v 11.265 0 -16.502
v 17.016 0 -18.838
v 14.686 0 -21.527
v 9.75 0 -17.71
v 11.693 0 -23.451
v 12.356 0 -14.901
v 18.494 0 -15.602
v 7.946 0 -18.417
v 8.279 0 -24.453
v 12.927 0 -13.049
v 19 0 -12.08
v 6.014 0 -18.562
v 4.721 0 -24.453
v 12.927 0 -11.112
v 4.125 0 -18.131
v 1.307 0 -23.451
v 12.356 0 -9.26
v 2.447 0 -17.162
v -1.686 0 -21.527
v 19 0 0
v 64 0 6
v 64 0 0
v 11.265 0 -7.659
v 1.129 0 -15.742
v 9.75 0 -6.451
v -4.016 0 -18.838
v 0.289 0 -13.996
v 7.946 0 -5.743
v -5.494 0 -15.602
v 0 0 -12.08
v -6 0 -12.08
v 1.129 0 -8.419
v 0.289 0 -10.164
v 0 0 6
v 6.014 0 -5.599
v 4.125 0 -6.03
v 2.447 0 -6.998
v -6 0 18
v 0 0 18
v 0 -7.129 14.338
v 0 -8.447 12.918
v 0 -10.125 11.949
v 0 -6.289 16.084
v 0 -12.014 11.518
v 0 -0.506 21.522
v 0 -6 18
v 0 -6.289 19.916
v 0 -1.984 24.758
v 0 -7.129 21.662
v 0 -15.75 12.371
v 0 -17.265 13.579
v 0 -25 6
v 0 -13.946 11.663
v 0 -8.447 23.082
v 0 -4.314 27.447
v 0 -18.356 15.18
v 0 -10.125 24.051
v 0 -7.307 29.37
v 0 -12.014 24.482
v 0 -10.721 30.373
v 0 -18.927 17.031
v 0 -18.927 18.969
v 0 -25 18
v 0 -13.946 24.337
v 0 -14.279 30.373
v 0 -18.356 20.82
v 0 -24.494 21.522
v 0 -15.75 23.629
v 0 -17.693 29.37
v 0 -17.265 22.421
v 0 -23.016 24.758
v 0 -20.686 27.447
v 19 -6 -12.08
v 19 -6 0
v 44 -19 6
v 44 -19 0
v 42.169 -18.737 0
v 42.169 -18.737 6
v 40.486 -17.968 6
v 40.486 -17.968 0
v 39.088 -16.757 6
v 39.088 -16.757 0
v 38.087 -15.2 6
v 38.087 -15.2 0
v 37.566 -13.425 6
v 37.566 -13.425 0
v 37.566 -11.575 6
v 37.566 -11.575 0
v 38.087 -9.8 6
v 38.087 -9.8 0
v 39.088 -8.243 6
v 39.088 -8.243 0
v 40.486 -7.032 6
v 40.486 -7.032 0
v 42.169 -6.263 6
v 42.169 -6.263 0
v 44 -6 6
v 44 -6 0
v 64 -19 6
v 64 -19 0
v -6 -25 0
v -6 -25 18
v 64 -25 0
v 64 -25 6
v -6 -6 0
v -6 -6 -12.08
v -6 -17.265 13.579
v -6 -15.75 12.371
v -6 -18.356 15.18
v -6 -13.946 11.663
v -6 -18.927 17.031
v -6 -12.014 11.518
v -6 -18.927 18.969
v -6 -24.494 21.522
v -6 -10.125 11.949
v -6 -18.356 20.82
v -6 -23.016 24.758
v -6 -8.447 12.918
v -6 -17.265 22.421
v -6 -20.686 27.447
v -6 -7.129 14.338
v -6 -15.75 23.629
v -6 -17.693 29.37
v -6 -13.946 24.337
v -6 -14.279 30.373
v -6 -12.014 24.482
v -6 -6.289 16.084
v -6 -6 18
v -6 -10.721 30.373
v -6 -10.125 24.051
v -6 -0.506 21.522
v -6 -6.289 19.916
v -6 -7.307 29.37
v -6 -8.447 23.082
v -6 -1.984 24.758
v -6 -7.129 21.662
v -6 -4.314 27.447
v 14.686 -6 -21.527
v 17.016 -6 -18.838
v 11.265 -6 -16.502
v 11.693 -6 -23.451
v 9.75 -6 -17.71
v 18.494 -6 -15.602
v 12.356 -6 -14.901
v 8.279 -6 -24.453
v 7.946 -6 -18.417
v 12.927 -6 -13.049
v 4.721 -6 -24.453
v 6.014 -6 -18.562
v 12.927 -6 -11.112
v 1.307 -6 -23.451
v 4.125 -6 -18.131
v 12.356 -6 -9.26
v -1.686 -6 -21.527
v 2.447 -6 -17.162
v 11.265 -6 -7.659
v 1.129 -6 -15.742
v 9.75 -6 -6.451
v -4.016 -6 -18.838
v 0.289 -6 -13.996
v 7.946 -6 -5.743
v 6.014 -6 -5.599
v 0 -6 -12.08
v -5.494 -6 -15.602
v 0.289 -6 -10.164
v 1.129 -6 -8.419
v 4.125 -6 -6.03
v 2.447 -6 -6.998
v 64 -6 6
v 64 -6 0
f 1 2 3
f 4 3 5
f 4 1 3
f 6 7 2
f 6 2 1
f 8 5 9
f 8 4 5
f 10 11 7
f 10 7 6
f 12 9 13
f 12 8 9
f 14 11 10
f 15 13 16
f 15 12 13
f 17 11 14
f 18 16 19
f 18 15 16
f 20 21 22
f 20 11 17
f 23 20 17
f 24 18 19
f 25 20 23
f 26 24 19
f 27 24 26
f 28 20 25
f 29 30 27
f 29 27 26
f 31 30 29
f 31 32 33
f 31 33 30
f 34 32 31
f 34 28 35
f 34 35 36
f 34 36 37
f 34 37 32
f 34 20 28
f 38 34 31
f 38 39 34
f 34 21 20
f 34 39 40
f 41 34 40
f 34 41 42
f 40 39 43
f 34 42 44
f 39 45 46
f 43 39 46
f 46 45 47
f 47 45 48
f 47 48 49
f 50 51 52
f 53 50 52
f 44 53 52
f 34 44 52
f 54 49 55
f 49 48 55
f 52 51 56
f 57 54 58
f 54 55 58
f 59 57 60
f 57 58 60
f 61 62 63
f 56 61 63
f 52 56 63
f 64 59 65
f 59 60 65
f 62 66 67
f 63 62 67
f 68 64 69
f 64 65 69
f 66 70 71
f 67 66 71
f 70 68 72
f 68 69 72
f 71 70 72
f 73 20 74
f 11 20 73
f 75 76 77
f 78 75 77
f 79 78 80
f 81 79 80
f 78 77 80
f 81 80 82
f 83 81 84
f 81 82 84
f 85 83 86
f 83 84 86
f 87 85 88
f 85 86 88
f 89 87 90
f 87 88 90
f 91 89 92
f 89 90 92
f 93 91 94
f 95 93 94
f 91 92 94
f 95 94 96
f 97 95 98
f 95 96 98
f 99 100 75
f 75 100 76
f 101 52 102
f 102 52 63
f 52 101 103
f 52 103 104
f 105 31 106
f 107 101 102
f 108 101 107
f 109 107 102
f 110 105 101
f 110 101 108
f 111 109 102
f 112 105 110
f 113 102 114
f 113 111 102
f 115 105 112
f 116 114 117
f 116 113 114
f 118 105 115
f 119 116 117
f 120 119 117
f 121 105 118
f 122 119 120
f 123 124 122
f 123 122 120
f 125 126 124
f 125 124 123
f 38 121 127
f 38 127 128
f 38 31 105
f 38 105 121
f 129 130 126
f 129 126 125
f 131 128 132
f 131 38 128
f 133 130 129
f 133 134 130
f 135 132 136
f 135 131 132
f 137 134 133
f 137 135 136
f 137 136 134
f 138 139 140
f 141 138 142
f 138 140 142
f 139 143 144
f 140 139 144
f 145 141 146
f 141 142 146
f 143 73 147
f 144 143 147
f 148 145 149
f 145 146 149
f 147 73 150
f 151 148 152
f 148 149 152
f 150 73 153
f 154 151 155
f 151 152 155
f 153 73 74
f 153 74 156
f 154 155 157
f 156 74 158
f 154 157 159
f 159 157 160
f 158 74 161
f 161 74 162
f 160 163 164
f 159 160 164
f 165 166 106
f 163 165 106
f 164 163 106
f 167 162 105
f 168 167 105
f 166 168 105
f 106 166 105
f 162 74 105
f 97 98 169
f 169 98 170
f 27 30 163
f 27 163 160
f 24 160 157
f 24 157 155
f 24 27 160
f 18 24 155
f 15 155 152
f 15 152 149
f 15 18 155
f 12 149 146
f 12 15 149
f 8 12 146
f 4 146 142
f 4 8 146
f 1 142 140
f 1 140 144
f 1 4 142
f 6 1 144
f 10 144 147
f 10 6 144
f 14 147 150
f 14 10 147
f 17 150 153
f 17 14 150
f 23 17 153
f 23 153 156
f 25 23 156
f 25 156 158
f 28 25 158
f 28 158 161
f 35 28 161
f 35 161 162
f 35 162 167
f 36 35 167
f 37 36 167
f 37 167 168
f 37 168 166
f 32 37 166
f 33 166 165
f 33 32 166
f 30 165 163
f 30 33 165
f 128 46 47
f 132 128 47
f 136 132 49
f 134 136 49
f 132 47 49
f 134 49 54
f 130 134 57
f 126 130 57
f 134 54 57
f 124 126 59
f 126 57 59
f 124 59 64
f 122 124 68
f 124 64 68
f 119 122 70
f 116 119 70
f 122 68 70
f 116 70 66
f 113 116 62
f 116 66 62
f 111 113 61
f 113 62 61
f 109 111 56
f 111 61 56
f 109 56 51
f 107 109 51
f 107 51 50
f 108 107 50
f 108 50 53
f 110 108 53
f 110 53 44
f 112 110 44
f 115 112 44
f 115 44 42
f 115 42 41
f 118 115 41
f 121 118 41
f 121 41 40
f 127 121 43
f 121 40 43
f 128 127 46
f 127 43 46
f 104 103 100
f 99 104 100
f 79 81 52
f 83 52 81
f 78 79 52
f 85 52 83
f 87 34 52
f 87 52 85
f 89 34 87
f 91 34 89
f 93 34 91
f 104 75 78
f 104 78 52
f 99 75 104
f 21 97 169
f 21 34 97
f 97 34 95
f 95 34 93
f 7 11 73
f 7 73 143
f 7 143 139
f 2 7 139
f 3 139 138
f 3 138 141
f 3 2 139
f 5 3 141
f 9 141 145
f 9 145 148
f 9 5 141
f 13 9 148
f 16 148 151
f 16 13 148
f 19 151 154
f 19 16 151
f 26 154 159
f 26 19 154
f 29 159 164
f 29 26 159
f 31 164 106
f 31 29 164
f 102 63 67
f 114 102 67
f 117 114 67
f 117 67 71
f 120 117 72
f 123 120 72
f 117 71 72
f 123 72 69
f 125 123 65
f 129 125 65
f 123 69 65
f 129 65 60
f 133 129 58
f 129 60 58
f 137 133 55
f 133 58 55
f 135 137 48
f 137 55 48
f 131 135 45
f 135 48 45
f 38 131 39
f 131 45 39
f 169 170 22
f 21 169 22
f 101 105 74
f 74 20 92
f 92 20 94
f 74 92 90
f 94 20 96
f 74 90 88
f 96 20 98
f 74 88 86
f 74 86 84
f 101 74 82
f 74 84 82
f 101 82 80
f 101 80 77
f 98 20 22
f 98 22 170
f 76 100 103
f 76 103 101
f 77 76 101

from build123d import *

# Parameters (mm, degrees)
F1_DEPTH = 6
F3_DEPTH = 6
F5_DEPTH = 6


with BuildPart() as f1:
    # F0 (on Top) → F1 (new body)
    with BuildSketch(Plane.XY):
        with BuildLine():
            Line((64, 0), (0, 0))
            Line((0, 0), (0, -25))
            Line((0, -25), (64, -25))
            Line((64, -25), (64, -19))
            Line((64, -19), (44, -19))
            ThreePointArc((44, -19), (37.5, -12.5), (44, -6))
            Line((44, -6), (64, -6))
            Line((64, -6), (64, 0))
        make_face()
    extrude(amount=F1_DEPTH)

    # F2 (on face) → F3 (join)
    with BuildSketch(Plane(origin=(0, 0, 0), x_dir=(0, -1, 0), z_dir=(-1, 0, 0))):
        with BuildLine():
            Line((0, 0), (25, 0))
            Line((25, 0), (25, 18))
            ThreePointArc((25, 18), (12.5, 5.5), (0, 18))
            Line((0, 18), (0, 0))
        make_face()
        with BuildLine():
            ThreePointArc((0, 18), (12.5, 5.5), (25, 18))
            Line((25, 18), (19, 18))
            ThreePointArc((19, 18), (12.5, 11.5), (6, 18))
            Line((6, 18), (0, 18))
        make_face()
        with BuildLine():
            Line((19, 18), (25, 18))
            ThreePointArc((25, 18), (12.5, 30.5), (0, 18))
            Line((0, 18), (6, 18))
            ThreePointArc((6, 18), (12.5, 24.5), (19, 18))
        make_face()
    extrude(amount=F3_DEPTH)

    # F4 (on face) → F5 (join)
    with BuildSketch(Plane(origin=(0, 0, 0), x_dir=(-1, 0, 0), z_dir=(0, 1, 0))):
        with BuildLine():
            Line((6, -12.0803898498), (6, 5.9196101502))
            Line((6, 5.9196101502), (-19, 5.9196101502))
            Line((-19, 5.9196101502), (-19, -12.0803898498))
            ThreePointArc((-19, -12.0803898498), (-6.5, 0.4196101502), (6, -12.0803898498))
        make_face()
        with BuildLine():
            ThreePointArc((-19, -12.0803898498), (-6.5, -24.5803898498), (6, -12.0803898498))
            Line((6, -12.0803898498), (0, -12.0803898498))
            ThreePointArc((0, -12.0803898498), (-6.5, -18.5803898498), (-13, -12.0803898498))
            Line((-13, -12.0803898498), (-19, -12.0803898498))
        make_face()
        with BuildLine():
            Line((0, -12.0803898498), (6, -12.0803898498))
            ThreePointArc((6, -12.0803898498), (-6.5, 0.4196101502), (-19, -12.0803898498))
            Line((-19, -12.0803898498), (-13, -12.0803898498))
            ThreePointArc((-13, -12.0803898498), (-6.5, -5.5803898498), (0, -12.0803898498))
        make_face()
    extrude(amount=-F5_DEPTH)


solid = f1.part
